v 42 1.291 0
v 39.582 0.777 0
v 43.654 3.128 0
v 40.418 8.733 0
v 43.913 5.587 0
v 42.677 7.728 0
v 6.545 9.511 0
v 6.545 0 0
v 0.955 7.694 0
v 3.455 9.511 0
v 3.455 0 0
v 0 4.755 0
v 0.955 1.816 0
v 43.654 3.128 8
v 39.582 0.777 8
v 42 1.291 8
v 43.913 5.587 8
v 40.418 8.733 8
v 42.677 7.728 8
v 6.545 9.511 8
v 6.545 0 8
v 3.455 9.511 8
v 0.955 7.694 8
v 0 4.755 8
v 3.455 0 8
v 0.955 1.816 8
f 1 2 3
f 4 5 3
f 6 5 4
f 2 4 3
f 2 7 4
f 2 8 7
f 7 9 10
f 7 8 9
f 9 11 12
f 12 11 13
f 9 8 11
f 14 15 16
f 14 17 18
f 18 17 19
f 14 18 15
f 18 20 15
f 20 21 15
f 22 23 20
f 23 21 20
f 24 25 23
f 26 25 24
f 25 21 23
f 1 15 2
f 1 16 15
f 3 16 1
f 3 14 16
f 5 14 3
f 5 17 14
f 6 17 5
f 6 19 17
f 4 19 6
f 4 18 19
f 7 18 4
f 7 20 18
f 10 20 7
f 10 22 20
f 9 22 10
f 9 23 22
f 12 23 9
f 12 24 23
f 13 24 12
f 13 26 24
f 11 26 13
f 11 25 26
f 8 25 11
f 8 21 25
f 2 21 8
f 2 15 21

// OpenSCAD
$fn = 32;

// ----------------------------------------------------------------------
// Lever arm: two bosses 10 and 8 mm, 35 mm between centres
// ----------------------------------------------------------------------

// --- parameters (mm) ---
profile_height = 8;       // extrusion height
profile_points = 13;      // points of the closed outline

profile = [[0, 4.755], [0.955, 1.816], [3.455, 0], [6.545, 0], [39.582, 0.777], [42, 1.291], [43.654, 3.128], [43.913, 5.587], [42.677, 7.728], [40.418, 8.733], [6.545, 9.511], [3.455, 9.511], [0.955, 7.694]];  // single closed polygon, 13 points, counter clockwise

// --- the one profile operation ---
linear_extrude(height = profile_height) polygon(points = profile);
